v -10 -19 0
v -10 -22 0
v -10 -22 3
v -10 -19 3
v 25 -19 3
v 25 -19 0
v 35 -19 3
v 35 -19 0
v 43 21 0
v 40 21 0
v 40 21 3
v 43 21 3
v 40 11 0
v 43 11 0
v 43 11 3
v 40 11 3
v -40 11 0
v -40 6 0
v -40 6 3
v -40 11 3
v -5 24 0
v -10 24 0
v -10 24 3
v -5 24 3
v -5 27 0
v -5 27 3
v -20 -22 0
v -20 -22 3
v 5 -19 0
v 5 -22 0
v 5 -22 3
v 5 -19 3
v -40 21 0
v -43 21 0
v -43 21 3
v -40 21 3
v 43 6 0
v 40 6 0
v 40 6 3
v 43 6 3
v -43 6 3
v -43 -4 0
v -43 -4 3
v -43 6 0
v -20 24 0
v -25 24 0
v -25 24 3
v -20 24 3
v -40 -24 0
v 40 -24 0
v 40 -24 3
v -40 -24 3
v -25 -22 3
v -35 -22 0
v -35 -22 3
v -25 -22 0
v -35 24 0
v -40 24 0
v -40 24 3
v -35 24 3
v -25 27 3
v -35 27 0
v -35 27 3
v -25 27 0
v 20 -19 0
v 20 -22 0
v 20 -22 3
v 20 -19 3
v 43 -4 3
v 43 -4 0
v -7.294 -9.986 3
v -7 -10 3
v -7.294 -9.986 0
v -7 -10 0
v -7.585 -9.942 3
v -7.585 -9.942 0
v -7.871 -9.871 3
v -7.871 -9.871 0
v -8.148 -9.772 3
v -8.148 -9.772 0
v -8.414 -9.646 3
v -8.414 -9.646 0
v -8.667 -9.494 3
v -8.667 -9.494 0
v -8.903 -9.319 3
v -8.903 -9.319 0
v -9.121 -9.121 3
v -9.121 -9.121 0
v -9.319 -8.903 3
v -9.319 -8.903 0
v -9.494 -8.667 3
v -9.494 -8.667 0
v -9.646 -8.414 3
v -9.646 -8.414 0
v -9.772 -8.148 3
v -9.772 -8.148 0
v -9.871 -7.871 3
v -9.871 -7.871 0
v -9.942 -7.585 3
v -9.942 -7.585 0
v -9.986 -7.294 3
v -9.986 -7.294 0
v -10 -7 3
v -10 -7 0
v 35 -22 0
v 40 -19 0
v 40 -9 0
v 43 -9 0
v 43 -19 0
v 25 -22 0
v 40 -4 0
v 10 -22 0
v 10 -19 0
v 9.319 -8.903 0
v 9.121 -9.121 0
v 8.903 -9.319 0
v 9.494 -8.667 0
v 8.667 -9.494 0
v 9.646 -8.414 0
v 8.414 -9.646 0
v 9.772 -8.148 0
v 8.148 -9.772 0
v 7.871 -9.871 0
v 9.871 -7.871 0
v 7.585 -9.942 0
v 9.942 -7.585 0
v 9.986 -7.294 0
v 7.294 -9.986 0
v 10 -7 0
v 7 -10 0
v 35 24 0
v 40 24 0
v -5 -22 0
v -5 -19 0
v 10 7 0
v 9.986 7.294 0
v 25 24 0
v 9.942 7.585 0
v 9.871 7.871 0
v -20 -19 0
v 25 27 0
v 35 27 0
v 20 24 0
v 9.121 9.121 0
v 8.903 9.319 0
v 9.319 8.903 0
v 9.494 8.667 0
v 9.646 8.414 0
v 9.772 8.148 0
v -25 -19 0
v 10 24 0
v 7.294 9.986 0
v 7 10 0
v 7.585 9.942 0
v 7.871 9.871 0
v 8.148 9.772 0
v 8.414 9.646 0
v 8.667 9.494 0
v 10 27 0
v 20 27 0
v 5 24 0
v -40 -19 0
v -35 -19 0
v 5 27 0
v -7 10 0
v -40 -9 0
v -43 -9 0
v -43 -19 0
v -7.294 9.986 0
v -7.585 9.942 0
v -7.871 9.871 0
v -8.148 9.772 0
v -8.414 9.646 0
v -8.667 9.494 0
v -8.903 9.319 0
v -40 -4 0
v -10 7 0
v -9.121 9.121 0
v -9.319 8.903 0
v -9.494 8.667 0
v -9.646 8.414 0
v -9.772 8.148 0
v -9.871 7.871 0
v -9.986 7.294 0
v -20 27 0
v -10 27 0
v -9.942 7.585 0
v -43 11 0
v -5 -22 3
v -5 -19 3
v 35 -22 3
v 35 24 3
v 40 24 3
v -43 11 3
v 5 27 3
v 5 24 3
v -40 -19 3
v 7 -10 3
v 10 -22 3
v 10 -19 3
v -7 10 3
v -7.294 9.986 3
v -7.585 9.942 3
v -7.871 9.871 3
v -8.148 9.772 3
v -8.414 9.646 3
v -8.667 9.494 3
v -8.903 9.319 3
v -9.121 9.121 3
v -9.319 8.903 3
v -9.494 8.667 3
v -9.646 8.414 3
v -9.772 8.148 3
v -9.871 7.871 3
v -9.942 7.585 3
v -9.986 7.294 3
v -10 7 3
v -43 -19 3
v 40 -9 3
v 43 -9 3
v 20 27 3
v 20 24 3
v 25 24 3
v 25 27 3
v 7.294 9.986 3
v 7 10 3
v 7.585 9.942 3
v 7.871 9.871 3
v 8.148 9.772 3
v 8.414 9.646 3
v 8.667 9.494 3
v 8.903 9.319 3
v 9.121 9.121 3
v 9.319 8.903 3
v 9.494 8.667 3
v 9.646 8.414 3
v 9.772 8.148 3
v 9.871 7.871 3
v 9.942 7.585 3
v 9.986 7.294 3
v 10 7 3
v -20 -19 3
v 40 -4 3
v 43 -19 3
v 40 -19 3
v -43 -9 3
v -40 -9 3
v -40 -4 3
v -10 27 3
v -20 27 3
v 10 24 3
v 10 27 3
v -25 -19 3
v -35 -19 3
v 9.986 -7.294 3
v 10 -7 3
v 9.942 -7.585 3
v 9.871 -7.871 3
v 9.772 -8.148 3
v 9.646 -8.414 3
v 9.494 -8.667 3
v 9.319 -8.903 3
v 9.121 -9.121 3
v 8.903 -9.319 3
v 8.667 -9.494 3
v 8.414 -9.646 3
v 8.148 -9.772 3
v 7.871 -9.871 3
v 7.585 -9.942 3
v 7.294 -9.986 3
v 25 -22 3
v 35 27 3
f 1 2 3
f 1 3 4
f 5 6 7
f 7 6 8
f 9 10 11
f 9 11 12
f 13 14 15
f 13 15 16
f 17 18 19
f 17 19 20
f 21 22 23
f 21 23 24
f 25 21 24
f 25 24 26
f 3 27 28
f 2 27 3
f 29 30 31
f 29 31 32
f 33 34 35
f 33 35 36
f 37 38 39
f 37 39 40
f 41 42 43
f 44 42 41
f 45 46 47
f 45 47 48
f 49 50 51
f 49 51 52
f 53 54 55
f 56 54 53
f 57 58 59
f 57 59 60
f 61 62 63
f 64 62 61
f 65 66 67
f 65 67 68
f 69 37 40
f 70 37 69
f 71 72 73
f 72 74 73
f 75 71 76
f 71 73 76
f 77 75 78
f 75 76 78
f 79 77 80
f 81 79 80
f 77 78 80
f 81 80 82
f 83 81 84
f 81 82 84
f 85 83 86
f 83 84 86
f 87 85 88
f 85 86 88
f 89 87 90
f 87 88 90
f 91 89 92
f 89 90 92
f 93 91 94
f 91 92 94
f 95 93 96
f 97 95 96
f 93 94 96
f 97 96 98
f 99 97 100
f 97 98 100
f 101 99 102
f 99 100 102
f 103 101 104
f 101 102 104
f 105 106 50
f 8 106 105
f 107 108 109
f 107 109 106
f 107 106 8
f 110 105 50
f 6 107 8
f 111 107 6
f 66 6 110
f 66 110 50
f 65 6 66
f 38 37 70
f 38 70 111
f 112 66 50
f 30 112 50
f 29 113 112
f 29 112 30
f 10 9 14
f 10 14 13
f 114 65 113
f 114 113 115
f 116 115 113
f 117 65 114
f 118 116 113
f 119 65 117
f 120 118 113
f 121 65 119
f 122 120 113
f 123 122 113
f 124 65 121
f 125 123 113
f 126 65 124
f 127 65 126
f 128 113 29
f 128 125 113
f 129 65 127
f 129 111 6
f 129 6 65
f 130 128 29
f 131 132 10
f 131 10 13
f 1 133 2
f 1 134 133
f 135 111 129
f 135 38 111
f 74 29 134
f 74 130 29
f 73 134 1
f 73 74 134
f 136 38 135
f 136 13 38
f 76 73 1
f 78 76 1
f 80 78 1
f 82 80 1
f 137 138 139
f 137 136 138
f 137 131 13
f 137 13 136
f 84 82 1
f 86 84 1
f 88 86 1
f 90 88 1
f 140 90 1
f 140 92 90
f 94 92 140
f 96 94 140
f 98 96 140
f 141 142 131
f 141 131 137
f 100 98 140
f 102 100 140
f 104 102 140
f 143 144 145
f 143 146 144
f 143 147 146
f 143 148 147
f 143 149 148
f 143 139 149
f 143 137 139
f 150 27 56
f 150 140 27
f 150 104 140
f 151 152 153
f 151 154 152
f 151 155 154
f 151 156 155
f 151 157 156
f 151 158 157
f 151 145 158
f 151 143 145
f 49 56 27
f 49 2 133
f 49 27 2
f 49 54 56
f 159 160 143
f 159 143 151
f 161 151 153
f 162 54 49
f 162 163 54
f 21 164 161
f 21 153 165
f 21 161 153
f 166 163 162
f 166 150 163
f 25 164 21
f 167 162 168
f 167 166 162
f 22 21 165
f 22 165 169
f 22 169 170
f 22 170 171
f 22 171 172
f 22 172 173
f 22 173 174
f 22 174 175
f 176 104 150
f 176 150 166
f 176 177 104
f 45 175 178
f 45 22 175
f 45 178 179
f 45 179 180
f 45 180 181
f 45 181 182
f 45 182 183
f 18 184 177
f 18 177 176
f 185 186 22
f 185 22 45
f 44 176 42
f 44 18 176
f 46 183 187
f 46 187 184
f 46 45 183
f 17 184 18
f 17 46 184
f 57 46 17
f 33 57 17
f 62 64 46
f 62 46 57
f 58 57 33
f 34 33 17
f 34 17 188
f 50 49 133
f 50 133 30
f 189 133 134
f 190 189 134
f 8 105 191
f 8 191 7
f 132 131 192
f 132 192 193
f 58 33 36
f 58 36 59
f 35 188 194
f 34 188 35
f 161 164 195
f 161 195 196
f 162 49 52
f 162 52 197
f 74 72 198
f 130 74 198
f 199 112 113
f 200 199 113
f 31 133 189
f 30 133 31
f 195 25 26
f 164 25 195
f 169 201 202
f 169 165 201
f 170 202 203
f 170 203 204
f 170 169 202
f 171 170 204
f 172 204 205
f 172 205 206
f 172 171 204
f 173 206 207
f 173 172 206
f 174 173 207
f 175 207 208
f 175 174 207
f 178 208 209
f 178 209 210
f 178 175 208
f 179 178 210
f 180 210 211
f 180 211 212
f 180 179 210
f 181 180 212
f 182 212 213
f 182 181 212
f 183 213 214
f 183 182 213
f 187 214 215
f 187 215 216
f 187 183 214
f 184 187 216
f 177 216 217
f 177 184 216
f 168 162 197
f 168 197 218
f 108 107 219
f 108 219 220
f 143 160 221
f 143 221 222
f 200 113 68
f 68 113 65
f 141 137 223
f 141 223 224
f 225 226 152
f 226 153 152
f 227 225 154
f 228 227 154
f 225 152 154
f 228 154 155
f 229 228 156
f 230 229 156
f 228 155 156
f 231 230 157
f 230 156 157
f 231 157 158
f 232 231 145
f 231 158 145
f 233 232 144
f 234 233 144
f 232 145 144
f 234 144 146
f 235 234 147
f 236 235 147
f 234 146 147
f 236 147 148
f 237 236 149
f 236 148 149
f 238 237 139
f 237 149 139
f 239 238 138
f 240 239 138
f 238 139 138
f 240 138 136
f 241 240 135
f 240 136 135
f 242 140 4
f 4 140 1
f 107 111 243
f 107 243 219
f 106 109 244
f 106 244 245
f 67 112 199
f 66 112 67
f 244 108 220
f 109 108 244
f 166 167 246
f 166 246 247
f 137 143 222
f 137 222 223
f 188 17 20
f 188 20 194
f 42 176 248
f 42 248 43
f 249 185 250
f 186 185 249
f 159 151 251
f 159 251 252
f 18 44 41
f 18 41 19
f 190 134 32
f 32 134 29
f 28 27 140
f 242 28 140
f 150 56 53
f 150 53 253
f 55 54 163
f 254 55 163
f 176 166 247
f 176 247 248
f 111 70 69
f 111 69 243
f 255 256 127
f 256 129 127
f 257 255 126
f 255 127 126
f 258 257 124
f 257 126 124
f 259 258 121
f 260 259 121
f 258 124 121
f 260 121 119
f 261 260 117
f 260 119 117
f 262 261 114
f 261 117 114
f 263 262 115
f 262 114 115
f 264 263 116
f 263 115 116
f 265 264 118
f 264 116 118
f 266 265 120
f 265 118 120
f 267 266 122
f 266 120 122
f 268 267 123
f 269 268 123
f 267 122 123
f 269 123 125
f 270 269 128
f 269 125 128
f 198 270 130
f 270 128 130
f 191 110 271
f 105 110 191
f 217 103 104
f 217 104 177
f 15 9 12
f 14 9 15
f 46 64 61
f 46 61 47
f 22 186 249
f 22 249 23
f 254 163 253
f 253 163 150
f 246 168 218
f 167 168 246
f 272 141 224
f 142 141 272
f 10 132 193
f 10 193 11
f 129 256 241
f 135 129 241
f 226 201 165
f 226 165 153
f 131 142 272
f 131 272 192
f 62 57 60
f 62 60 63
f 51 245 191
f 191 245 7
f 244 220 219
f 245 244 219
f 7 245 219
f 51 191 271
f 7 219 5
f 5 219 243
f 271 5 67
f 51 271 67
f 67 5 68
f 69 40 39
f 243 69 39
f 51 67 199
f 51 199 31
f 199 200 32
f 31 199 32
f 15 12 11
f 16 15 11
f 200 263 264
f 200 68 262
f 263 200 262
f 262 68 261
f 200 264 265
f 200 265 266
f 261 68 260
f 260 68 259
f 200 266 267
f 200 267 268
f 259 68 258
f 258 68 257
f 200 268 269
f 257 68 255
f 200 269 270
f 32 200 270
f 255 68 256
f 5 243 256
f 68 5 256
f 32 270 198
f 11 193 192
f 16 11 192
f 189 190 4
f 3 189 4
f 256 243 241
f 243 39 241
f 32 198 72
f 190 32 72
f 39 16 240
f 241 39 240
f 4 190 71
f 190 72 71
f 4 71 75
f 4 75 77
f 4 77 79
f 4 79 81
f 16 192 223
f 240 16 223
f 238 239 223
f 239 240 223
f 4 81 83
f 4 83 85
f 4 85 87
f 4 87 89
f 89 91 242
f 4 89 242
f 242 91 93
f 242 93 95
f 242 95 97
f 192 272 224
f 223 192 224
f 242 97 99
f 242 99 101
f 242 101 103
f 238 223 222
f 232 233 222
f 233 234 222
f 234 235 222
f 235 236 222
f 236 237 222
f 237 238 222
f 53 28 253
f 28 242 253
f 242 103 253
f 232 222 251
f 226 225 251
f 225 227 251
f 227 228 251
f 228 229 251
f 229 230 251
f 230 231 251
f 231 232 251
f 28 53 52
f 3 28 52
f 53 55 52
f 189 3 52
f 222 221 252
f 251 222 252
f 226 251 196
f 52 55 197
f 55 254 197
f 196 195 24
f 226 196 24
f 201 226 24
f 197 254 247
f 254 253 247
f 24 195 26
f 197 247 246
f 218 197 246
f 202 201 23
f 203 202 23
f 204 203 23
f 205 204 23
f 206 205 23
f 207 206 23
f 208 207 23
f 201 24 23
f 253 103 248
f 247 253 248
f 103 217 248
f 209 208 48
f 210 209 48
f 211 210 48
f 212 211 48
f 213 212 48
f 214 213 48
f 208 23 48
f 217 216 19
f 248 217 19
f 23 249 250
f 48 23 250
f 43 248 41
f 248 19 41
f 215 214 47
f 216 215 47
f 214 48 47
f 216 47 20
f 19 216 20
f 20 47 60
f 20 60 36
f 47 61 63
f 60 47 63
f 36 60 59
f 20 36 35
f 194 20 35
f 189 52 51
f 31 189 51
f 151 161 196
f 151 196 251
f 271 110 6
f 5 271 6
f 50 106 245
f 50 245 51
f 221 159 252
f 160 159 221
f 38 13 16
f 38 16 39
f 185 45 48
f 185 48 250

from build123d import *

# Parameters (mm, degrees)
SKETCH_1_W          = 10
SKETCH_1_H          = 3
EXTRUDE_1_DEPTH     = 3
SKETCH_2_W          = 20
SKETCH_2_H          = 20
CUT_EXTRUDE_1_DEPTH = 10
FILLET_1_R          = 3


with BuildPart() as part:
    # 草图1 → 凸台-拉伸1 (new body)
    with BuildSketch(Plane.XY):
        Polygon((-40, 24), (-35, 24), (-35, 27), (-25, 27), (-25, 24), (-20, 24), (-20, 27), (-10, 27), (-10, 24), (-5, 24), (-5, 27), (5, 27), (5, 24), (10, 24), (10, 27), (20, 27), (20, 24), (25, 24), (25, 27), (35, 27), (35, 24), (40, 24), (40, 21), (43, 21), (43, 11), (40, 11), (40, 6), (43, 6), (43, -4), (40, -4), (40, -9), (43, -9), (43, -19), (40, -19), (40, -24), (-40, -24), (-40, -19), (-43, -19), (-43, -9), (-40, -9), (-40, -4), (-43, -4), (-43, 6), (-40, 6), (-40, 11), (-43, 11), (-43, 21), (-40, 21), align=None)
        with Locations((-15, -20.5)):
            Rectangle(SKETCH_1_W, SKETCH_1_H, mode=Mode.SUBTRACT)
        with Locations((-30, -20.5)):
            Rectangle(SKETCH_1_W, SKETCH_1_H, mode=Mode.SUBTRACT)
        with Locations((0, -20.5)):
            Rectangle(SKETCH_1_W, SKETCH_1_H, mode=Mode.SUBTRACT)
        with Locations((15, -20.5)):
            Rectangle(SKETCH_1_W, SKETCH_1_H, mode=Mode.SUBTRACT)
        with Locations((30, -20.5)):
            Rectangle(SKETCH_1_W, SKETCH_1_H, mode=Mode.SUBTRACT)
    extrude(amount=EXTRUDE_1_DEPTH)

    # 草图2 → 切除-拉伸1 (cut)
    with BuildSketch(Plane.XY.offset(3)):
        Rectangle(SKETCH_2_W, SKETCH_2_H)
    extrude(amount=-CUT_EXTRUDE_1_DEPTH, mode=Mode.SUBTRACT)

    # 圆角1
    fillet_1_edges = [part.edges().sort_by_distance(p)[0] for p in [
        (10, 10, 1.5),
        (10, -10, 1.5),
        (-10, -10, 1.5),
        (-10, 10, 1.5),
    ]]
    fillet(fillet_1_edges, radius=FILLET_1_R)


solid = part.part
